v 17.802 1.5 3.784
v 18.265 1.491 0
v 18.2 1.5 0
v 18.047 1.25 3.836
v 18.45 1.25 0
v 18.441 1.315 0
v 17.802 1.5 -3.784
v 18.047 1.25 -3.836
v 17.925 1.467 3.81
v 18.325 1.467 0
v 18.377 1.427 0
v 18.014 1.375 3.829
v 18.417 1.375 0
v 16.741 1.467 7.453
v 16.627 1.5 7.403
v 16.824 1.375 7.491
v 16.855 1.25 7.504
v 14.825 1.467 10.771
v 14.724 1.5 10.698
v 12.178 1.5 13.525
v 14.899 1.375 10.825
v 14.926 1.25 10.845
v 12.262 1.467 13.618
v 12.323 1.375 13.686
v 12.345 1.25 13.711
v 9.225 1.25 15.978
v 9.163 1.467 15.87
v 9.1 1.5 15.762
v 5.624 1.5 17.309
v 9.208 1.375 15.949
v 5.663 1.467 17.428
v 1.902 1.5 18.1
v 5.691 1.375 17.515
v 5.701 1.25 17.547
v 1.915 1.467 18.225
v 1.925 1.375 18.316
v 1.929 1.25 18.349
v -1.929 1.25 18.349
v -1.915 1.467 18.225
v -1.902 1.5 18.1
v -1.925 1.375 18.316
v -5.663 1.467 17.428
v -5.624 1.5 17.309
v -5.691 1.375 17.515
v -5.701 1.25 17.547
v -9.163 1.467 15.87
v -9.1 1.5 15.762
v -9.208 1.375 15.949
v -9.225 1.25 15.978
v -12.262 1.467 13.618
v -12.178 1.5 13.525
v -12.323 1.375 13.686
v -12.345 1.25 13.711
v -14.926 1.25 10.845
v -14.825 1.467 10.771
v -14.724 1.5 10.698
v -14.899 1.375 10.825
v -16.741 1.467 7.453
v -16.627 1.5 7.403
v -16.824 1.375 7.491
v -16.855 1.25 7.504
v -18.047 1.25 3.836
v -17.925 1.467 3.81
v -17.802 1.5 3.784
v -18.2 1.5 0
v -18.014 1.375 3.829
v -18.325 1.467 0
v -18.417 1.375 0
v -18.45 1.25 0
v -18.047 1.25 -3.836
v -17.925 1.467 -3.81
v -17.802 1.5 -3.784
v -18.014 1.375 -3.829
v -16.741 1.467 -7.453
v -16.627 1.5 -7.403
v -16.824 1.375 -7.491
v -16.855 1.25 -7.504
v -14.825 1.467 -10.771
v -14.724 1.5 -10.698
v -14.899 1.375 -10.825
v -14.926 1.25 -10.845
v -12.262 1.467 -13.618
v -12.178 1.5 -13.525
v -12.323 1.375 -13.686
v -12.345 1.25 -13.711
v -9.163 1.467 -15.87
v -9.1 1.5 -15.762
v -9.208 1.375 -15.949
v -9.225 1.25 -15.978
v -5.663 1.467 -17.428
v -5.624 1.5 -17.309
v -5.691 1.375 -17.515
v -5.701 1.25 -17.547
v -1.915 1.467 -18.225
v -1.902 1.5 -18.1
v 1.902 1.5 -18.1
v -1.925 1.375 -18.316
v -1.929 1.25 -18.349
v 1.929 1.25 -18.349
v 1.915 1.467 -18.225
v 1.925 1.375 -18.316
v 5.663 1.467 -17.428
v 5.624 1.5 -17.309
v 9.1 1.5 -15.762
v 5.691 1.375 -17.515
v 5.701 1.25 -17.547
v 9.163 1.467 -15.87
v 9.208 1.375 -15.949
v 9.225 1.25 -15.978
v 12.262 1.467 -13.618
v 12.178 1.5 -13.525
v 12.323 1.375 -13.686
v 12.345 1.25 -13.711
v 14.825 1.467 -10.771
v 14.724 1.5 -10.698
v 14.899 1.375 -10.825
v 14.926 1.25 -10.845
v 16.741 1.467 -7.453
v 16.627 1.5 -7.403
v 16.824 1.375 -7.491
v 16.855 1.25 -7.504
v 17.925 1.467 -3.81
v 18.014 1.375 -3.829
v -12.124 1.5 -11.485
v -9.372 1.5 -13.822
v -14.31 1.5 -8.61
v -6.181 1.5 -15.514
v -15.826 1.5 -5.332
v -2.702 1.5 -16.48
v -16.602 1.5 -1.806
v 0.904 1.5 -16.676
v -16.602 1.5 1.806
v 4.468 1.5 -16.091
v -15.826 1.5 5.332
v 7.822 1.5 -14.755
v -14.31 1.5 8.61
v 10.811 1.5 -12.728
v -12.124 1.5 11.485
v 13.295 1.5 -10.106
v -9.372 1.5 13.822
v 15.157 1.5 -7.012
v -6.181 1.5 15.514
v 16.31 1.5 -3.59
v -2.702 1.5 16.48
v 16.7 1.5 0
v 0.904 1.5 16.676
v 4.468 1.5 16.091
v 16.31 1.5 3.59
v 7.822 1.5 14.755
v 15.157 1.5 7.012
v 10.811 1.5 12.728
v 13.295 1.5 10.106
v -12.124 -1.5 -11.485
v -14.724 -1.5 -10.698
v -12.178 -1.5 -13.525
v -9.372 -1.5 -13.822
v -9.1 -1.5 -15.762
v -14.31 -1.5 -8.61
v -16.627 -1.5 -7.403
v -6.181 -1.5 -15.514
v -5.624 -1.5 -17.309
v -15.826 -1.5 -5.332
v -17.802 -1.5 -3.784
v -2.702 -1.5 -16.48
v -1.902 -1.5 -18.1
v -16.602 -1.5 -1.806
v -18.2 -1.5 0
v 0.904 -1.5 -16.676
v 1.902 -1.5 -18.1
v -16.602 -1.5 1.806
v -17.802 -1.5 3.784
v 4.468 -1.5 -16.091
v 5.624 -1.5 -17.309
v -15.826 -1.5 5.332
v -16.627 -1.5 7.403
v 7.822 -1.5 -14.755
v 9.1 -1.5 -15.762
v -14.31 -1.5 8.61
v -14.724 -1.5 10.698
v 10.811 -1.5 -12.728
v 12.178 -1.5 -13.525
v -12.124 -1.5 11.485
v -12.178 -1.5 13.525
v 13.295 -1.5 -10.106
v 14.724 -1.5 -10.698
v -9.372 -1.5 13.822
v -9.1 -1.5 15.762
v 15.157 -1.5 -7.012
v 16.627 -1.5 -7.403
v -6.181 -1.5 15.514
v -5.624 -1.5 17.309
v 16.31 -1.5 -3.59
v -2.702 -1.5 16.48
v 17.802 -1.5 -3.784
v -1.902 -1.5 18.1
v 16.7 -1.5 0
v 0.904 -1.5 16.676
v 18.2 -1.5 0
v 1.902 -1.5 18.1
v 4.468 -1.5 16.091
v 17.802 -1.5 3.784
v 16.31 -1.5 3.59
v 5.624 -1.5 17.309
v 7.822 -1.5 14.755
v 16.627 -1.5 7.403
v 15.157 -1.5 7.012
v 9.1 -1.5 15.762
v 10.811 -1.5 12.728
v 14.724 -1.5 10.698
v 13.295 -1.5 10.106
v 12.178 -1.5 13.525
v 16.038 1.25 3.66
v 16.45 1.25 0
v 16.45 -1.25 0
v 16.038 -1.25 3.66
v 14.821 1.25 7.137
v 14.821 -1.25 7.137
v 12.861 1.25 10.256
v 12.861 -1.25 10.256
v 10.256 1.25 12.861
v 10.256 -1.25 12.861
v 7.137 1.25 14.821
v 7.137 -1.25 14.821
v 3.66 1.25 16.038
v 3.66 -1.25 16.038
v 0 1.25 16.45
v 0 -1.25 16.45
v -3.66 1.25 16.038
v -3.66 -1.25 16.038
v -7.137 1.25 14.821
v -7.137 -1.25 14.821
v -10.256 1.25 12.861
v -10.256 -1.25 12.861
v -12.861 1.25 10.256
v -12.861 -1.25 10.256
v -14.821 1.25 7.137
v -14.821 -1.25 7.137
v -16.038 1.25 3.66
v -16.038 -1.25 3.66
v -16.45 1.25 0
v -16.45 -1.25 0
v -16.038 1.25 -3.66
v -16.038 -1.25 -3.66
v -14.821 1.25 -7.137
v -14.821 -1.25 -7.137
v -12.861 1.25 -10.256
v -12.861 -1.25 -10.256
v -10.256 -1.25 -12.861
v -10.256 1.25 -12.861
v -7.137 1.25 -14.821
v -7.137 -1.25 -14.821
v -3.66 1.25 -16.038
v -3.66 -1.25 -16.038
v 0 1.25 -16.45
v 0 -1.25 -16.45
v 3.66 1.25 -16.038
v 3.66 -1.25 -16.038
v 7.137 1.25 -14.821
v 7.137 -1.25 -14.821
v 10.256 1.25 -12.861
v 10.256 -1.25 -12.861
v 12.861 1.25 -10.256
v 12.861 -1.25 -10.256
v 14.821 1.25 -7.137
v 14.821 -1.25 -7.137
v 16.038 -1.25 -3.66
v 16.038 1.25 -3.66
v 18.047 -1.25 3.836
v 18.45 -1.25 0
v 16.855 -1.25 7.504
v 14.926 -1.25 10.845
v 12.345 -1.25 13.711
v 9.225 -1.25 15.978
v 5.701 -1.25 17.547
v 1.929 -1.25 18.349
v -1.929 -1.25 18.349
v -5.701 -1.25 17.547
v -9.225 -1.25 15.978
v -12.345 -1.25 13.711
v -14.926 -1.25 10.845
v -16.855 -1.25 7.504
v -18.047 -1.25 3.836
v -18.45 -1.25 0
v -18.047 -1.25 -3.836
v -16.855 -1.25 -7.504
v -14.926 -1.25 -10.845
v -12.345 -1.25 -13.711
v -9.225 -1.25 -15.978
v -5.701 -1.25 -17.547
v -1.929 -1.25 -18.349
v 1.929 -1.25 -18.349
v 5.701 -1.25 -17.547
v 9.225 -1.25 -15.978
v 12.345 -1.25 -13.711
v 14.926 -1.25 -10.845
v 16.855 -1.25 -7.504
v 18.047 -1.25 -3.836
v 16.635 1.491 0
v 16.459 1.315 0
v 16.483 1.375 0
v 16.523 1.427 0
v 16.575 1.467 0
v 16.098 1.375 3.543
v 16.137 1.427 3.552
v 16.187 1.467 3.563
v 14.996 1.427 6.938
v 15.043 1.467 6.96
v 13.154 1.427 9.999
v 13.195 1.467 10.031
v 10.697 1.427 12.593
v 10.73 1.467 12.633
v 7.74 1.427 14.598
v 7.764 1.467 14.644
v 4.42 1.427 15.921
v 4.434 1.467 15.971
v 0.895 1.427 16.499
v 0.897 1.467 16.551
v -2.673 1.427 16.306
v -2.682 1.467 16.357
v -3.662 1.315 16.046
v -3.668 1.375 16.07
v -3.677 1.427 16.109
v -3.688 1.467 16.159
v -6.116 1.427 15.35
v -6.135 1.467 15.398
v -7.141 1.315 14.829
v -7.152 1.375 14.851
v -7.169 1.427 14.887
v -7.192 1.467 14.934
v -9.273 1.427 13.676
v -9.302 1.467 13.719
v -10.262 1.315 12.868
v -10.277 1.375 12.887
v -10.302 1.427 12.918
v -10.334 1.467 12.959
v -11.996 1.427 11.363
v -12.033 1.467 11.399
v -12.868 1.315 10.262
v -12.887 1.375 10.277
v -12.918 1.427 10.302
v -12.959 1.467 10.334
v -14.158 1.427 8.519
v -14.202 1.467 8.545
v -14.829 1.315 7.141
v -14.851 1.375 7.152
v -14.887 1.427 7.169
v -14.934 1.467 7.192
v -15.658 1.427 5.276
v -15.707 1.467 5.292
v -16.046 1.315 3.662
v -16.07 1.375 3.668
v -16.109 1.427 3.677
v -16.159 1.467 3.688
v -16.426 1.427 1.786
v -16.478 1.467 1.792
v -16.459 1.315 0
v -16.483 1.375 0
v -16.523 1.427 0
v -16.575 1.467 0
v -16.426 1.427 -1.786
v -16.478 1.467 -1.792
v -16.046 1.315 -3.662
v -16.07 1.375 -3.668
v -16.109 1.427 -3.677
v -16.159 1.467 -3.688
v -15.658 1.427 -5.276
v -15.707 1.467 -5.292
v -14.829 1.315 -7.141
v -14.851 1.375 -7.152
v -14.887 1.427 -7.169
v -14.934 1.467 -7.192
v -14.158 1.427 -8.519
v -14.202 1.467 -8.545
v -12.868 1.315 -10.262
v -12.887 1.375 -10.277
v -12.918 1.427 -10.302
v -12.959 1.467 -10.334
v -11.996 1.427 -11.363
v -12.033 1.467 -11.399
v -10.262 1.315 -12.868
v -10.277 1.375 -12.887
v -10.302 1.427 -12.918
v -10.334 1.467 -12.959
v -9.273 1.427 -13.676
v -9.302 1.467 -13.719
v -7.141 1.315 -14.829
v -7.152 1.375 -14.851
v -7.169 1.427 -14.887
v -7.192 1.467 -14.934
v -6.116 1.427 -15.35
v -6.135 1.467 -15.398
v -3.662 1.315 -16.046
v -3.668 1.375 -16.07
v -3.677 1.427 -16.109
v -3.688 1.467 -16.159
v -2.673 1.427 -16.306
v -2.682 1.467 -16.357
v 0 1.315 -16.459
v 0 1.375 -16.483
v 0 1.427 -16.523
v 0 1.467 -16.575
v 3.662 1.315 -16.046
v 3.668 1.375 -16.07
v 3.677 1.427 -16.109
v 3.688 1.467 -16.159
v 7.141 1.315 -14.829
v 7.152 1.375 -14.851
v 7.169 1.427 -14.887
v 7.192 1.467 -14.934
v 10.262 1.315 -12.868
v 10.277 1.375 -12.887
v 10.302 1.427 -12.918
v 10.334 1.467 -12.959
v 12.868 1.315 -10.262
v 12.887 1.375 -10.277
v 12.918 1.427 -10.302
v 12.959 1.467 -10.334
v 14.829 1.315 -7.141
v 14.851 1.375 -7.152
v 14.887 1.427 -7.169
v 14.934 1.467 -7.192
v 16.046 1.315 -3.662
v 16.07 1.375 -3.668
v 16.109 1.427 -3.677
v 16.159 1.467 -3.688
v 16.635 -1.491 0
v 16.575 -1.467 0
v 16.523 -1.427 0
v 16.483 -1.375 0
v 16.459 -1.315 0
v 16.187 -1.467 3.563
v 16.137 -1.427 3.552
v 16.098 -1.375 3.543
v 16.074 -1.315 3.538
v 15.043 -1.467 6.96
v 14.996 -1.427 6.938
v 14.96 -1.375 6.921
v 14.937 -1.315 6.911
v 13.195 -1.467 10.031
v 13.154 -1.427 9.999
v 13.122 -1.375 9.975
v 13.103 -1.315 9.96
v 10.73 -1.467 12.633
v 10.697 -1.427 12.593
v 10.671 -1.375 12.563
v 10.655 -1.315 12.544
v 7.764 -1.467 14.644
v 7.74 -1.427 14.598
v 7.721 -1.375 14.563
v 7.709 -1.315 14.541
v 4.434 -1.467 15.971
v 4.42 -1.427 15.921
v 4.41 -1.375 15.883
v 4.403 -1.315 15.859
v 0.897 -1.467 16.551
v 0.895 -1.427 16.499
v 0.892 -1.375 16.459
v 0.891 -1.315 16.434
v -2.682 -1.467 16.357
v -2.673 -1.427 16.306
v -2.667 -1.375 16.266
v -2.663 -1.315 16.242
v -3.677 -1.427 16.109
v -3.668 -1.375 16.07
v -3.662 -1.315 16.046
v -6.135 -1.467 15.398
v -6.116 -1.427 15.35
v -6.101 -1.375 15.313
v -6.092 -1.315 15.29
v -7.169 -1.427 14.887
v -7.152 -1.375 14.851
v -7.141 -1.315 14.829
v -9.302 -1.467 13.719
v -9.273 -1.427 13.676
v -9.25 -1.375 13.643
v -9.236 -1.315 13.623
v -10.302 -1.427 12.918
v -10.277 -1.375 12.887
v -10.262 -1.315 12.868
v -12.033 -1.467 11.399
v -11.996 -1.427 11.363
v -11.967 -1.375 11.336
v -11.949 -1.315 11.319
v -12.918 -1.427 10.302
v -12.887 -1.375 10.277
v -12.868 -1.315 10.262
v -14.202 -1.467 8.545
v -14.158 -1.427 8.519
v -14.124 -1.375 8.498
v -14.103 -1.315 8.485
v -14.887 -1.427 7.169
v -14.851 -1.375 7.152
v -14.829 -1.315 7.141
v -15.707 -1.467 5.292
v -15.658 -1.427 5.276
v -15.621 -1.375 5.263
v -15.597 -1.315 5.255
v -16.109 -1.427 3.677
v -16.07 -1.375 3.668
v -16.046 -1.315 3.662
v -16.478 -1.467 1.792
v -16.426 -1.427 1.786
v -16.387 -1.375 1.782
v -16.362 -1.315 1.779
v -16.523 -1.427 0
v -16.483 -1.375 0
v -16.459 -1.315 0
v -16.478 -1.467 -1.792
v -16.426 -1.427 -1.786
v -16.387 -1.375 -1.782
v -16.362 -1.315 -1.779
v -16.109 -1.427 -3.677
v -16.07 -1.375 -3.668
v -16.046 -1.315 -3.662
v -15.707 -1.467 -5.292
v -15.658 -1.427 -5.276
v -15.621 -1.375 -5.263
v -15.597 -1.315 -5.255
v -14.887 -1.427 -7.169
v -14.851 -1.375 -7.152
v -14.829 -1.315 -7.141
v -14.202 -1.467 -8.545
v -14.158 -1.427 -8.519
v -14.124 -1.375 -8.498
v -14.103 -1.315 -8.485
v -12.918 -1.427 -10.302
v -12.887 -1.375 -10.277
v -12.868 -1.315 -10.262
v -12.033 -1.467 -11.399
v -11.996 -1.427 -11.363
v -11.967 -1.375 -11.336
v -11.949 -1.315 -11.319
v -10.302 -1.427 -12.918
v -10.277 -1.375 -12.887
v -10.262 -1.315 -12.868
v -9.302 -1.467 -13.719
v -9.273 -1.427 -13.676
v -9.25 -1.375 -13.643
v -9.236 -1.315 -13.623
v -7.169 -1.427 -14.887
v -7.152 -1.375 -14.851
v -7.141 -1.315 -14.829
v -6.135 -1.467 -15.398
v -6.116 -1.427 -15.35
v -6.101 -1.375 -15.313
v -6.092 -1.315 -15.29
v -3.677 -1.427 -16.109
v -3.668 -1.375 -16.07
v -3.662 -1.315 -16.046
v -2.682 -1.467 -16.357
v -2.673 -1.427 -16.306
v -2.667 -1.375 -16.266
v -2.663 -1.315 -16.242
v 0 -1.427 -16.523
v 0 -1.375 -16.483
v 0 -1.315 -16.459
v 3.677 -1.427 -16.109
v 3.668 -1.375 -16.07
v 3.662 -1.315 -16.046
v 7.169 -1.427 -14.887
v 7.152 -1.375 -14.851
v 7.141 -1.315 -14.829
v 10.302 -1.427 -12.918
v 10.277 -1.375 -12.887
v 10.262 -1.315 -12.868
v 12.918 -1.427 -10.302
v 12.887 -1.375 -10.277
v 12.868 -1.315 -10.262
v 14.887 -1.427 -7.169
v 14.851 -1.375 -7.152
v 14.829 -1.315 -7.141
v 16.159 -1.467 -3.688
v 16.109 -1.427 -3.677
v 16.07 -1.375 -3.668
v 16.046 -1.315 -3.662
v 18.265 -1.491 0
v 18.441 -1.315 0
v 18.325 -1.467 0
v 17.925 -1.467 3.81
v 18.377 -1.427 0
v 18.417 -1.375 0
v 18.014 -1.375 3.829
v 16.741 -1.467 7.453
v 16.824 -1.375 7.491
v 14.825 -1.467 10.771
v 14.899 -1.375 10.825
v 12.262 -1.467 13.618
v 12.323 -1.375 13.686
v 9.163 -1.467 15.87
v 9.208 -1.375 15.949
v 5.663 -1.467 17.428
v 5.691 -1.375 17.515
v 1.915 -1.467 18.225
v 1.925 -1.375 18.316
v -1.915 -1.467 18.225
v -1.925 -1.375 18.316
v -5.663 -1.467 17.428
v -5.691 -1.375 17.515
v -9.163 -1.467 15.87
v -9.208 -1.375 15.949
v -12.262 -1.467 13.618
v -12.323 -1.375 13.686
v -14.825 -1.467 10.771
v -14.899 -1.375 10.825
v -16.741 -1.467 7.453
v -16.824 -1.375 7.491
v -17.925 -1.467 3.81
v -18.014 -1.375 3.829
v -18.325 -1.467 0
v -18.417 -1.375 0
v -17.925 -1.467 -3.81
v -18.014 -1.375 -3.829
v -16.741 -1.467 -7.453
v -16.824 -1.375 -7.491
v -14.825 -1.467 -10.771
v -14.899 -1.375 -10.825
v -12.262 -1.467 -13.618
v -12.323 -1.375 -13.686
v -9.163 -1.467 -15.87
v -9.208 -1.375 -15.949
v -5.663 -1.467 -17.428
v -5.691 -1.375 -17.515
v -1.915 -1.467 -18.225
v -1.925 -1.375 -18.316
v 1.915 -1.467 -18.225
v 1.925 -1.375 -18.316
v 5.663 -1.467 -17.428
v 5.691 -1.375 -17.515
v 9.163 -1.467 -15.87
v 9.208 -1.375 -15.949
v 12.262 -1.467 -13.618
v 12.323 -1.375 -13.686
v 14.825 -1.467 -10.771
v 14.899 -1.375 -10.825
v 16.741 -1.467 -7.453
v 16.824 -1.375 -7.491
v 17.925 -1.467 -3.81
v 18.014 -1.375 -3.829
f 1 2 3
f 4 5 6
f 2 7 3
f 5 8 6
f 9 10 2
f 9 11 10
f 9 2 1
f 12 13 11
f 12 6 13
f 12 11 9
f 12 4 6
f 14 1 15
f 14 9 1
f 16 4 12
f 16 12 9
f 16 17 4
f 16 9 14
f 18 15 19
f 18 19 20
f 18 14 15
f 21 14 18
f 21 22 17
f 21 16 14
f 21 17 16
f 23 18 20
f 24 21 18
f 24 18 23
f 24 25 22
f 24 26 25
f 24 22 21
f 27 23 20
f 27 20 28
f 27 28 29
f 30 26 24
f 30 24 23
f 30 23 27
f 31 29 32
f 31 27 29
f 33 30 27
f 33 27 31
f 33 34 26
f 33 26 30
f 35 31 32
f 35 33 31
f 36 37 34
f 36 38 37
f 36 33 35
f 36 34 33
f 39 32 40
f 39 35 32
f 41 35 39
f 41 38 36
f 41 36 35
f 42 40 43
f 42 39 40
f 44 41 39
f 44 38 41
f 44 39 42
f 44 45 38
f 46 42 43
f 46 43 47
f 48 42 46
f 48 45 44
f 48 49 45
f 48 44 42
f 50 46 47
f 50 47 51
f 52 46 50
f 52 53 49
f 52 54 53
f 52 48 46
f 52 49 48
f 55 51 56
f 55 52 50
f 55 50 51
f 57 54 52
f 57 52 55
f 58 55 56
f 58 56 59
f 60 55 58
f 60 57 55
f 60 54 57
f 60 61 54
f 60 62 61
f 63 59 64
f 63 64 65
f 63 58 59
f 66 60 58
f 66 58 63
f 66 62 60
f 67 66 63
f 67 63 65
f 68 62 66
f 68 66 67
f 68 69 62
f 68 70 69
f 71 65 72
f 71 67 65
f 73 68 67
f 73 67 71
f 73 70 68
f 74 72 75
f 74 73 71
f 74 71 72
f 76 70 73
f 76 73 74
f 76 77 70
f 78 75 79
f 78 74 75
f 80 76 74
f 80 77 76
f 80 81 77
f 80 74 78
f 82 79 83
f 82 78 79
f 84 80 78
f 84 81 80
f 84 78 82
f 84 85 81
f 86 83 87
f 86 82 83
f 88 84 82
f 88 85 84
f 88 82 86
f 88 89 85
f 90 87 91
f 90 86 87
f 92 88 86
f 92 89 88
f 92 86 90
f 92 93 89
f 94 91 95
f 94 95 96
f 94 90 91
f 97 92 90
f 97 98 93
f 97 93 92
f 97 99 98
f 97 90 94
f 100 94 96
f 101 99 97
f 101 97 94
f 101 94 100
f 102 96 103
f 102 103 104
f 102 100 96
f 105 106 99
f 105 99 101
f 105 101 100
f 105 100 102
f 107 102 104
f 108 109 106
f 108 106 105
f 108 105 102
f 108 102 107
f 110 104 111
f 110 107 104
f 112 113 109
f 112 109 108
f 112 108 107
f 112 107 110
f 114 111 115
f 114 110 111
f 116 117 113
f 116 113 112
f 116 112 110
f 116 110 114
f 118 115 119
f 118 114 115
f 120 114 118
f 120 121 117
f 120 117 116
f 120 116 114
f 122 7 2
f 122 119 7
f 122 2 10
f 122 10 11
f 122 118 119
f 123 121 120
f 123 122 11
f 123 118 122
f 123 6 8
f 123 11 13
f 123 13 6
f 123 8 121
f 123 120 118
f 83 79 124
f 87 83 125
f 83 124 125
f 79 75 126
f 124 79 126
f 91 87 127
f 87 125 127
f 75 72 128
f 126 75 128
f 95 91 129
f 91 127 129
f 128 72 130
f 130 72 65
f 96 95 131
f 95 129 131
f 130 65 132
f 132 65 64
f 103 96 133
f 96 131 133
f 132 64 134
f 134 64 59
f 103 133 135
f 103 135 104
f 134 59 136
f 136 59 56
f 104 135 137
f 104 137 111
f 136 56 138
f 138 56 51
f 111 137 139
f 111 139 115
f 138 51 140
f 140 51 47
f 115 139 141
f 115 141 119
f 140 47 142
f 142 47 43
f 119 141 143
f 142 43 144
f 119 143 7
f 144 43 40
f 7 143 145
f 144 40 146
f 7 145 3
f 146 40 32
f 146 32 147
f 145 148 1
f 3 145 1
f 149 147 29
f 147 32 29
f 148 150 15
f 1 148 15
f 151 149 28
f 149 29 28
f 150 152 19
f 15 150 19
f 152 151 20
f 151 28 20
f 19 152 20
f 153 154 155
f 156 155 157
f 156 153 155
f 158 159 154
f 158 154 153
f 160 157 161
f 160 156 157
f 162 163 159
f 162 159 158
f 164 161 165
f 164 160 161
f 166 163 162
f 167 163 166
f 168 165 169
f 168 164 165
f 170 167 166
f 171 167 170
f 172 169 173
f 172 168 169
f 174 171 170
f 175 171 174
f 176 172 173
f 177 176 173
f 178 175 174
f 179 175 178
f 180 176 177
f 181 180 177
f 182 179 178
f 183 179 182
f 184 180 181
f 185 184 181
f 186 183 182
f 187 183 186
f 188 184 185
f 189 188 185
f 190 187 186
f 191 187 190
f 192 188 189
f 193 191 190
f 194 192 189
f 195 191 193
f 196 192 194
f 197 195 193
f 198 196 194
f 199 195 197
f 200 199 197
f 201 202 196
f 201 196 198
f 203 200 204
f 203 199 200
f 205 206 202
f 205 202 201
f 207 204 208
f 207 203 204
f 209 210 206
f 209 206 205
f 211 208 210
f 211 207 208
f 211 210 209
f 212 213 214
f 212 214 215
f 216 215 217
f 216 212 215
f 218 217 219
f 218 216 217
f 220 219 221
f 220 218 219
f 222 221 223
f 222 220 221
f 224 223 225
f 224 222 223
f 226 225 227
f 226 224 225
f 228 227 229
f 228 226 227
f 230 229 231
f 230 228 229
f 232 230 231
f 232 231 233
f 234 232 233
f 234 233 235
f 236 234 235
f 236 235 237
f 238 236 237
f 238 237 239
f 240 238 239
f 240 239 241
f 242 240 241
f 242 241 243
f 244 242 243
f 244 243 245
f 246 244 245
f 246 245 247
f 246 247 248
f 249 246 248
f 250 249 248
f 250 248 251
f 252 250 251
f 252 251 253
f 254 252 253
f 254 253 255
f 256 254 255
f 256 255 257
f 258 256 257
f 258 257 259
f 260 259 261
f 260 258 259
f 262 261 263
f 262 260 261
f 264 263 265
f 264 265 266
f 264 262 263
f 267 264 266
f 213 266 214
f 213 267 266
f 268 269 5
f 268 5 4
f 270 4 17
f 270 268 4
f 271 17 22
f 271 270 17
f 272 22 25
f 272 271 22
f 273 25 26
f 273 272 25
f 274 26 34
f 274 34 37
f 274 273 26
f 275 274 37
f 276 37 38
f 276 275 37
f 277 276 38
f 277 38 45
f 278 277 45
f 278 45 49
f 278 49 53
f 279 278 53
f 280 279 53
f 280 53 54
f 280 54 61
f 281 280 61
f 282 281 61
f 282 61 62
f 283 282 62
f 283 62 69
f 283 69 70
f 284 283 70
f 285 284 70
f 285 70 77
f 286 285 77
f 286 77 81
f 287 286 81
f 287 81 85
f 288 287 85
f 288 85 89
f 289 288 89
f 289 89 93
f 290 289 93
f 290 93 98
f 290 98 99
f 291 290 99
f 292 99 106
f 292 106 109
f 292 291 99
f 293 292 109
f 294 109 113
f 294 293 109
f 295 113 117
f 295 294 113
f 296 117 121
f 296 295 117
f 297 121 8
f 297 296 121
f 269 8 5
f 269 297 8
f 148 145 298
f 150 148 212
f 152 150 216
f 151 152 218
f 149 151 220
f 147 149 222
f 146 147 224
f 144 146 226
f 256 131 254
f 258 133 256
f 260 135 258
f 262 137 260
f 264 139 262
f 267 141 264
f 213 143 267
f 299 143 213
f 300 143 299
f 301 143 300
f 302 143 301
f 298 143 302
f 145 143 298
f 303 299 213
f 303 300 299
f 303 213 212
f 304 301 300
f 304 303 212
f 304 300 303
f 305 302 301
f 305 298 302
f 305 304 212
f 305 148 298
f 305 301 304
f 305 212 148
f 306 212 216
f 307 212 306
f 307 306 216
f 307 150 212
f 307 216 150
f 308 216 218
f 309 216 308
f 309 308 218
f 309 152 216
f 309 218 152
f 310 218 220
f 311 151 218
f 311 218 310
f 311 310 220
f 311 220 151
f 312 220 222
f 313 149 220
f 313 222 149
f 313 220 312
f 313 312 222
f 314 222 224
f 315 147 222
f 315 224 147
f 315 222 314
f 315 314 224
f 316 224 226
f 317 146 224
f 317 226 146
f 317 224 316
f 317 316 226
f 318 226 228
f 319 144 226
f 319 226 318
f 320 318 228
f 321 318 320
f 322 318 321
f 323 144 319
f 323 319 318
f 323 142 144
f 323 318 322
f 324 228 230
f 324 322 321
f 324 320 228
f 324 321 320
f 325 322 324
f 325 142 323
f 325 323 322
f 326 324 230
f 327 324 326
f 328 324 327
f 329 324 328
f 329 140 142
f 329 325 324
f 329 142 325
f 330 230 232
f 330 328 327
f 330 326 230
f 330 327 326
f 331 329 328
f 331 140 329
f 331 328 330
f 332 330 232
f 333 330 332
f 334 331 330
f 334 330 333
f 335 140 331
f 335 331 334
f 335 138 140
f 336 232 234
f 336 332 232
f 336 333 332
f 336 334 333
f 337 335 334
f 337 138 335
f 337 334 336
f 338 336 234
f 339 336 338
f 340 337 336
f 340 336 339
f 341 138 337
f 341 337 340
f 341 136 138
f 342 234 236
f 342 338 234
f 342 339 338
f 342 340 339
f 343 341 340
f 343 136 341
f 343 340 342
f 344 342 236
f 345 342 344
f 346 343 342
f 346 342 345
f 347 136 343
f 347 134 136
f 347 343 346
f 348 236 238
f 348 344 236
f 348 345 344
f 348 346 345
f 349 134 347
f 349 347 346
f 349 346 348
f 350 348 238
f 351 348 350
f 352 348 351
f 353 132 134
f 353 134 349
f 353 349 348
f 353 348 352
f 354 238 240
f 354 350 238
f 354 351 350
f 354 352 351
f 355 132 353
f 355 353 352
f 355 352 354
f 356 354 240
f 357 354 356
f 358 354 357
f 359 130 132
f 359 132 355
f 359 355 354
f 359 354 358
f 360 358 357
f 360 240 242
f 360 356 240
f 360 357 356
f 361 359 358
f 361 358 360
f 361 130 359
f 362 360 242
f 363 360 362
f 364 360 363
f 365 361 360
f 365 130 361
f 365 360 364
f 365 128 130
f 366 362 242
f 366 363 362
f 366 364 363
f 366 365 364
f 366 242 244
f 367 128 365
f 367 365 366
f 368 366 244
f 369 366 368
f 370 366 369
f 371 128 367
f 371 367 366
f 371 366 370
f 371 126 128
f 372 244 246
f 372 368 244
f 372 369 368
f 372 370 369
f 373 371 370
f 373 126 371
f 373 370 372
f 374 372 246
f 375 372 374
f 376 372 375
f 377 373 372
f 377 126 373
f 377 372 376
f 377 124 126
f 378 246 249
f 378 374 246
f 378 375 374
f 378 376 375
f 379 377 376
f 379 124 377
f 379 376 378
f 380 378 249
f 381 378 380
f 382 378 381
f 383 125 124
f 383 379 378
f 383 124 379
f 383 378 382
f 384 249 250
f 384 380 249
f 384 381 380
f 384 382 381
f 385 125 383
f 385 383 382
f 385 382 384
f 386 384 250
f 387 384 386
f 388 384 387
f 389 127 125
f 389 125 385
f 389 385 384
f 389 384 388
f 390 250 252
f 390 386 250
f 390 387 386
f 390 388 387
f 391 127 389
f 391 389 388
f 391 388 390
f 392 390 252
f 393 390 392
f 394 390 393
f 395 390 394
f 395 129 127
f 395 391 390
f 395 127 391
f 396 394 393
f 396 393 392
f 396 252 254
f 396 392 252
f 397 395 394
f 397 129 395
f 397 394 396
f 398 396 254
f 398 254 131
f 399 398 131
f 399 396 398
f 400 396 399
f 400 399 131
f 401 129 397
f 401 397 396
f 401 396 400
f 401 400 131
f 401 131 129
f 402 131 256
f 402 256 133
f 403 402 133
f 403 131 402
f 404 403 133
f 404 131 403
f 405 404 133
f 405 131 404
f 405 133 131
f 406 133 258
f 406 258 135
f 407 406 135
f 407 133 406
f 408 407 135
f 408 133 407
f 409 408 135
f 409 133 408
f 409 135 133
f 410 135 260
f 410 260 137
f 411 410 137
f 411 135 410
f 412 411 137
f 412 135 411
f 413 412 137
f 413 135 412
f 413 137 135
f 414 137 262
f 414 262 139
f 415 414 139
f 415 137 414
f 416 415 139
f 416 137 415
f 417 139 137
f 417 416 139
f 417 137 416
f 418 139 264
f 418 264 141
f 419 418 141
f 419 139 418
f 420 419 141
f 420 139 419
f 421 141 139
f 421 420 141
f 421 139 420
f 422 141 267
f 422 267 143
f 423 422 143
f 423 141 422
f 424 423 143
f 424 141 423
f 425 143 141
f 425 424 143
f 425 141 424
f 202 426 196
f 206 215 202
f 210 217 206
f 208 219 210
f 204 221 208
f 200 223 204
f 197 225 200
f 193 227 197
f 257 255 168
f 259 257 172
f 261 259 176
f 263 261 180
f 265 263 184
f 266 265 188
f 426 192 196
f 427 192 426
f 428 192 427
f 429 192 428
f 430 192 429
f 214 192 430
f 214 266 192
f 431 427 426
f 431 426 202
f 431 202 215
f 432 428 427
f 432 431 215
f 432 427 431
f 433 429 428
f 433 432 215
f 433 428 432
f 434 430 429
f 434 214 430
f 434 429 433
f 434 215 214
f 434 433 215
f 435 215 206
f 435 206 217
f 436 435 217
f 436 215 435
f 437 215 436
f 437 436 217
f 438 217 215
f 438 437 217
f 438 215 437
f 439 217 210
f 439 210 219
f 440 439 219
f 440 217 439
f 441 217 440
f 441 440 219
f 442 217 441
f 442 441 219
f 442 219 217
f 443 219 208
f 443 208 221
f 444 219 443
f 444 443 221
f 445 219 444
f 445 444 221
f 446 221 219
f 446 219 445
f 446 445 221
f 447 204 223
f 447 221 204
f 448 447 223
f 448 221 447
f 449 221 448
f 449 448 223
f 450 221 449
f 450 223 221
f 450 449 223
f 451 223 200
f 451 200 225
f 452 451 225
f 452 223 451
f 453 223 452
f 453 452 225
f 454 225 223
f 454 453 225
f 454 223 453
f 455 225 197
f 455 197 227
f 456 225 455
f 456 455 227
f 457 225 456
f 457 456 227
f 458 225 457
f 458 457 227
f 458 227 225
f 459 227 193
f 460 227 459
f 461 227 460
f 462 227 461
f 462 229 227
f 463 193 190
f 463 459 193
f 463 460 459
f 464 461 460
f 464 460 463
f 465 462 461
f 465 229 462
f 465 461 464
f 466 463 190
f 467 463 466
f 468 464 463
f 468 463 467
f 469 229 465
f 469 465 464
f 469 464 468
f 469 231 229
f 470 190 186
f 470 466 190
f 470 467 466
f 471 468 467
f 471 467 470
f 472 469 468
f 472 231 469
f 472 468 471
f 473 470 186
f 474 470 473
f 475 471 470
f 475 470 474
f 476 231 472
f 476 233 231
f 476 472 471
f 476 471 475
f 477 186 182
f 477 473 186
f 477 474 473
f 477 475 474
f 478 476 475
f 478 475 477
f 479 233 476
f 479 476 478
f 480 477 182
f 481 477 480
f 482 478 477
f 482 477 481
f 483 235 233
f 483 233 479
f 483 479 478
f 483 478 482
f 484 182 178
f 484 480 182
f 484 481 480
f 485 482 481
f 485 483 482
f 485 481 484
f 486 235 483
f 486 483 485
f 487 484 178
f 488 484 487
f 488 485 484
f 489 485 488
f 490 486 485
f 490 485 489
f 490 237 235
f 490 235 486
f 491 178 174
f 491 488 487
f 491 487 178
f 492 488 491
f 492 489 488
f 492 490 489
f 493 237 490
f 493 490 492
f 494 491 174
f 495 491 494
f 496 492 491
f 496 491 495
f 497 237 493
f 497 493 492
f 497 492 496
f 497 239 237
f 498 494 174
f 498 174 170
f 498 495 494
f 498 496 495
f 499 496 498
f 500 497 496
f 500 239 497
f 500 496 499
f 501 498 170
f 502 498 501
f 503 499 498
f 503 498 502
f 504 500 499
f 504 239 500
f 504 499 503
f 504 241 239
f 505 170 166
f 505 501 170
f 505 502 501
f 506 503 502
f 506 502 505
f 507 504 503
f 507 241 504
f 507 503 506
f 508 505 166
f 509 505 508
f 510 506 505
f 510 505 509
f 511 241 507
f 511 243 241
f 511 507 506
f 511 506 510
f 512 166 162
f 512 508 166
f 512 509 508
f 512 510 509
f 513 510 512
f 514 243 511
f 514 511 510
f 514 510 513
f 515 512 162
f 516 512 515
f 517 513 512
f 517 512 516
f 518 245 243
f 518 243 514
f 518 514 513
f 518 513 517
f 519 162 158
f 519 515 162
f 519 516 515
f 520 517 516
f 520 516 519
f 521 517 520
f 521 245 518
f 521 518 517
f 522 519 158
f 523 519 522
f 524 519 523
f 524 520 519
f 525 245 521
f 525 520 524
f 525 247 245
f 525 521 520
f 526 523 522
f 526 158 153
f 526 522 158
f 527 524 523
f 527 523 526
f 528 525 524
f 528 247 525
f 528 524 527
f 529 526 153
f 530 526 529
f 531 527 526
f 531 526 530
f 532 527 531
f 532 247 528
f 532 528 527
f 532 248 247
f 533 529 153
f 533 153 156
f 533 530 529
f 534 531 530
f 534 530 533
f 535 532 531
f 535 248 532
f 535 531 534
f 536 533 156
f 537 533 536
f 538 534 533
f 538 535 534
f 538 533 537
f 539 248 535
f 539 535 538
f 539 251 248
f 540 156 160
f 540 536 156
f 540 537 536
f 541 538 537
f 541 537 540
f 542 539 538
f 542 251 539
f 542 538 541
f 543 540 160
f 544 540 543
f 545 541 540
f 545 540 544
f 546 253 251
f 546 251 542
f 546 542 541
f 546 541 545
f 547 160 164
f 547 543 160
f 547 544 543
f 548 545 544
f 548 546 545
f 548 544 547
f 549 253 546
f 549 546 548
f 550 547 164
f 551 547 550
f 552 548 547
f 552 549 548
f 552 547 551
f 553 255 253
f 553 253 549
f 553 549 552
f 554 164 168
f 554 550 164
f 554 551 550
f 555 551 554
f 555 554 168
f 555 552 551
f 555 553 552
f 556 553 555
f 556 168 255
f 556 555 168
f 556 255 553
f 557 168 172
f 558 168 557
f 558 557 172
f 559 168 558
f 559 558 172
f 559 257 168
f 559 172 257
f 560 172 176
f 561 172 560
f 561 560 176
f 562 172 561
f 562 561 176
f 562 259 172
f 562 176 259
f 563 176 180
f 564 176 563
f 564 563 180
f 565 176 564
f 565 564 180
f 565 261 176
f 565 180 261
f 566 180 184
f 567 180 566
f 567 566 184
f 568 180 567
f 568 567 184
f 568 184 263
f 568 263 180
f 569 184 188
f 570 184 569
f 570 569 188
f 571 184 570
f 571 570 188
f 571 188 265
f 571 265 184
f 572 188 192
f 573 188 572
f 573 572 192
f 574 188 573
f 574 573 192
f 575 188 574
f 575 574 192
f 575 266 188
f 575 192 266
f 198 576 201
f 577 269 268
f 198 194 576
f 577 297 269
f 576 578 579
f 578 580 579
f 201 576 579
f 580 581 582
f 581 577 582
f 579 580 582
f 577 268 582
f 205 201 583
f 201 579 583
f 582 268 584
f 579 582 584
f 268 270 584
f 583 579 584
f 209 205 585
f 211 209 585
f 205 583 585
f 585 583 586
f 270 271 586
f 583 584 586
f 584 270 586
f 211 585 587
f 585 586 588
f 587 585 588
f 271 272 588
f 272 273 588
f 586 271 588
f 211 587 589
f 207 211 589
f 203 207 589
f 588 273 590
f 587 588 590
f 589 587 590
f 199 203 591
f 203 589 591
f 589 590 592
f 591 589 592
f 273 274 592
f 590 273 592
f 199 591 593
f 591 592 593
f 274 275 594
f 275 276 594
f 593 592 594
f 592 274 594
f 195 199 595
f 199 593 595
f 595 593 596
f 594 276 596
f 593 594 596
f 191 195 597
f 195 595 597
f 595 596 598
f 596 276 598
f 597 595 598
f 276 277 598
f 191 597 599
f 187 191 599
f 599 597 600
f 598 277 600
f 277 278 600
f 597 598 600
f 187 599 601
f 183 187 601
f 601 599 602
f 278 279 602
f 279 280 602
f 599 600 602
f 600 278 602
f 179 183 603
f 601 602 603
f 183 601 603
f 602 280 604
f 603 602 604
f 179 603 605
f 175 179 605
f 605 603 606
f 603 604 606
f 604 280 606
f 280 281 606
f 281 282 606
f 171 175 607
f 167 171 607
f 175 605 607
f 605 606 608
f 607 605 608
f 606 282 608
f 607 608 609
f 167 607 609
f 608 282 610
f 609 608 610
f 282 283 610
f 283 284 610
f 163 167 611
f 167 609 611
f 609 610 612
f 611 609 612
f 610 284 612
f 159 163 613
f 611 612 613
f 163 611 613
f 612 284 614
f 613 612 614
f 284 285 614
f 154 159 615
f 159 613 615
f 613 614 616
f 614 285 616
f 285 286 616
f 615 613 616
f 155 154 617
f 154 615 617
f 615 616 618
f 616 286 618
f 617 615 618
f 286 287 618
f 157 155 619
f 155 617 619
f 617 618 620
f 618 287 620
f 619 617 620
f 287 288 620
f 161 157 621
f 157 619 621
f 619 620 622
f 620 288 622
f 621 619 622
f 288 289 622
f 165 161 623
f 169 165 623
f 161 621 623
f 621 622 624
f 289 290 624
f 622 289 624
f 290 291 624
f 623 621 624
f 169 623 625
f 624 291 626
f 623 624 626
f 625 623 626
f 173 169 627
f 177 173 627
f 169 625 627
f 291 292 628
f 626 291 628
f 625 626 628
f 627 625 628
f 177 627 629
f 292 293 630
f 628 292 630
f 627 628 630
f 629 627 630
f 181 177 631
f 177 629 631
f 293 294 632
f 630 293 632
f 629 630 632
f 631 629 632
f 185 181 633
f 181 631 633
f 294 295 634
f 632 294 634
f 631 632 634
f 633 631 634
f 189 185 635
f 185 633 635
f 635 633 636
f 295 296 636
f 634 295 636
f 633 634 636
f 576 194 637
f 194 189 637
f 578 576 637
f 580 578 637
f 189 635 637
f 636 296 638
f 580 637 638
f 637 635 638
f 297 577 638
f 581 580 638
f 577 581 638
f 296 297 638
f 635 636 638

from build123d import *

# Parameters (mm, degrees)
F0_R     = 18.45
F0_R_2   = 16.45
F1_DEPTH = 1.5
F2_R     = 0.25
F3_R     = 0.25
F4_R     = 0.25


with BuildPart() as f1:
    # F0 (on Front) → F1 (new body, symmetric)
    with BuildSketch(Plane.XZ):
        Circle(F0_R)
        Circle(F0_R_2, mode=Mode.SUBTRACT)
    extrude(amount=F1_DEPTH, both=True)

    # F2
    f2_edges = [f1.edges().sort_by_distance(p)[0] for p in [
        (-16.45, -1.5, 0),
    ]]
    fillet(f2_edges, radius=F2_R)

    # F3
    f3_edges = [f1.edges().sort_by_distance(p)[0] for p in [
        (-16.45, 1.5, 0),
    ]]
    fillet(f3_edges, radius=F3_R)

    # F4
    f4_edges = [f1.edges().sort_by_distance(p)[0] for p in [
        (-18.45, -1.5, 0),
        (-18.45, 1.5, 0),
    ]]
    fillet(f4_edges, radius=F4_R)


solid = f1.part
